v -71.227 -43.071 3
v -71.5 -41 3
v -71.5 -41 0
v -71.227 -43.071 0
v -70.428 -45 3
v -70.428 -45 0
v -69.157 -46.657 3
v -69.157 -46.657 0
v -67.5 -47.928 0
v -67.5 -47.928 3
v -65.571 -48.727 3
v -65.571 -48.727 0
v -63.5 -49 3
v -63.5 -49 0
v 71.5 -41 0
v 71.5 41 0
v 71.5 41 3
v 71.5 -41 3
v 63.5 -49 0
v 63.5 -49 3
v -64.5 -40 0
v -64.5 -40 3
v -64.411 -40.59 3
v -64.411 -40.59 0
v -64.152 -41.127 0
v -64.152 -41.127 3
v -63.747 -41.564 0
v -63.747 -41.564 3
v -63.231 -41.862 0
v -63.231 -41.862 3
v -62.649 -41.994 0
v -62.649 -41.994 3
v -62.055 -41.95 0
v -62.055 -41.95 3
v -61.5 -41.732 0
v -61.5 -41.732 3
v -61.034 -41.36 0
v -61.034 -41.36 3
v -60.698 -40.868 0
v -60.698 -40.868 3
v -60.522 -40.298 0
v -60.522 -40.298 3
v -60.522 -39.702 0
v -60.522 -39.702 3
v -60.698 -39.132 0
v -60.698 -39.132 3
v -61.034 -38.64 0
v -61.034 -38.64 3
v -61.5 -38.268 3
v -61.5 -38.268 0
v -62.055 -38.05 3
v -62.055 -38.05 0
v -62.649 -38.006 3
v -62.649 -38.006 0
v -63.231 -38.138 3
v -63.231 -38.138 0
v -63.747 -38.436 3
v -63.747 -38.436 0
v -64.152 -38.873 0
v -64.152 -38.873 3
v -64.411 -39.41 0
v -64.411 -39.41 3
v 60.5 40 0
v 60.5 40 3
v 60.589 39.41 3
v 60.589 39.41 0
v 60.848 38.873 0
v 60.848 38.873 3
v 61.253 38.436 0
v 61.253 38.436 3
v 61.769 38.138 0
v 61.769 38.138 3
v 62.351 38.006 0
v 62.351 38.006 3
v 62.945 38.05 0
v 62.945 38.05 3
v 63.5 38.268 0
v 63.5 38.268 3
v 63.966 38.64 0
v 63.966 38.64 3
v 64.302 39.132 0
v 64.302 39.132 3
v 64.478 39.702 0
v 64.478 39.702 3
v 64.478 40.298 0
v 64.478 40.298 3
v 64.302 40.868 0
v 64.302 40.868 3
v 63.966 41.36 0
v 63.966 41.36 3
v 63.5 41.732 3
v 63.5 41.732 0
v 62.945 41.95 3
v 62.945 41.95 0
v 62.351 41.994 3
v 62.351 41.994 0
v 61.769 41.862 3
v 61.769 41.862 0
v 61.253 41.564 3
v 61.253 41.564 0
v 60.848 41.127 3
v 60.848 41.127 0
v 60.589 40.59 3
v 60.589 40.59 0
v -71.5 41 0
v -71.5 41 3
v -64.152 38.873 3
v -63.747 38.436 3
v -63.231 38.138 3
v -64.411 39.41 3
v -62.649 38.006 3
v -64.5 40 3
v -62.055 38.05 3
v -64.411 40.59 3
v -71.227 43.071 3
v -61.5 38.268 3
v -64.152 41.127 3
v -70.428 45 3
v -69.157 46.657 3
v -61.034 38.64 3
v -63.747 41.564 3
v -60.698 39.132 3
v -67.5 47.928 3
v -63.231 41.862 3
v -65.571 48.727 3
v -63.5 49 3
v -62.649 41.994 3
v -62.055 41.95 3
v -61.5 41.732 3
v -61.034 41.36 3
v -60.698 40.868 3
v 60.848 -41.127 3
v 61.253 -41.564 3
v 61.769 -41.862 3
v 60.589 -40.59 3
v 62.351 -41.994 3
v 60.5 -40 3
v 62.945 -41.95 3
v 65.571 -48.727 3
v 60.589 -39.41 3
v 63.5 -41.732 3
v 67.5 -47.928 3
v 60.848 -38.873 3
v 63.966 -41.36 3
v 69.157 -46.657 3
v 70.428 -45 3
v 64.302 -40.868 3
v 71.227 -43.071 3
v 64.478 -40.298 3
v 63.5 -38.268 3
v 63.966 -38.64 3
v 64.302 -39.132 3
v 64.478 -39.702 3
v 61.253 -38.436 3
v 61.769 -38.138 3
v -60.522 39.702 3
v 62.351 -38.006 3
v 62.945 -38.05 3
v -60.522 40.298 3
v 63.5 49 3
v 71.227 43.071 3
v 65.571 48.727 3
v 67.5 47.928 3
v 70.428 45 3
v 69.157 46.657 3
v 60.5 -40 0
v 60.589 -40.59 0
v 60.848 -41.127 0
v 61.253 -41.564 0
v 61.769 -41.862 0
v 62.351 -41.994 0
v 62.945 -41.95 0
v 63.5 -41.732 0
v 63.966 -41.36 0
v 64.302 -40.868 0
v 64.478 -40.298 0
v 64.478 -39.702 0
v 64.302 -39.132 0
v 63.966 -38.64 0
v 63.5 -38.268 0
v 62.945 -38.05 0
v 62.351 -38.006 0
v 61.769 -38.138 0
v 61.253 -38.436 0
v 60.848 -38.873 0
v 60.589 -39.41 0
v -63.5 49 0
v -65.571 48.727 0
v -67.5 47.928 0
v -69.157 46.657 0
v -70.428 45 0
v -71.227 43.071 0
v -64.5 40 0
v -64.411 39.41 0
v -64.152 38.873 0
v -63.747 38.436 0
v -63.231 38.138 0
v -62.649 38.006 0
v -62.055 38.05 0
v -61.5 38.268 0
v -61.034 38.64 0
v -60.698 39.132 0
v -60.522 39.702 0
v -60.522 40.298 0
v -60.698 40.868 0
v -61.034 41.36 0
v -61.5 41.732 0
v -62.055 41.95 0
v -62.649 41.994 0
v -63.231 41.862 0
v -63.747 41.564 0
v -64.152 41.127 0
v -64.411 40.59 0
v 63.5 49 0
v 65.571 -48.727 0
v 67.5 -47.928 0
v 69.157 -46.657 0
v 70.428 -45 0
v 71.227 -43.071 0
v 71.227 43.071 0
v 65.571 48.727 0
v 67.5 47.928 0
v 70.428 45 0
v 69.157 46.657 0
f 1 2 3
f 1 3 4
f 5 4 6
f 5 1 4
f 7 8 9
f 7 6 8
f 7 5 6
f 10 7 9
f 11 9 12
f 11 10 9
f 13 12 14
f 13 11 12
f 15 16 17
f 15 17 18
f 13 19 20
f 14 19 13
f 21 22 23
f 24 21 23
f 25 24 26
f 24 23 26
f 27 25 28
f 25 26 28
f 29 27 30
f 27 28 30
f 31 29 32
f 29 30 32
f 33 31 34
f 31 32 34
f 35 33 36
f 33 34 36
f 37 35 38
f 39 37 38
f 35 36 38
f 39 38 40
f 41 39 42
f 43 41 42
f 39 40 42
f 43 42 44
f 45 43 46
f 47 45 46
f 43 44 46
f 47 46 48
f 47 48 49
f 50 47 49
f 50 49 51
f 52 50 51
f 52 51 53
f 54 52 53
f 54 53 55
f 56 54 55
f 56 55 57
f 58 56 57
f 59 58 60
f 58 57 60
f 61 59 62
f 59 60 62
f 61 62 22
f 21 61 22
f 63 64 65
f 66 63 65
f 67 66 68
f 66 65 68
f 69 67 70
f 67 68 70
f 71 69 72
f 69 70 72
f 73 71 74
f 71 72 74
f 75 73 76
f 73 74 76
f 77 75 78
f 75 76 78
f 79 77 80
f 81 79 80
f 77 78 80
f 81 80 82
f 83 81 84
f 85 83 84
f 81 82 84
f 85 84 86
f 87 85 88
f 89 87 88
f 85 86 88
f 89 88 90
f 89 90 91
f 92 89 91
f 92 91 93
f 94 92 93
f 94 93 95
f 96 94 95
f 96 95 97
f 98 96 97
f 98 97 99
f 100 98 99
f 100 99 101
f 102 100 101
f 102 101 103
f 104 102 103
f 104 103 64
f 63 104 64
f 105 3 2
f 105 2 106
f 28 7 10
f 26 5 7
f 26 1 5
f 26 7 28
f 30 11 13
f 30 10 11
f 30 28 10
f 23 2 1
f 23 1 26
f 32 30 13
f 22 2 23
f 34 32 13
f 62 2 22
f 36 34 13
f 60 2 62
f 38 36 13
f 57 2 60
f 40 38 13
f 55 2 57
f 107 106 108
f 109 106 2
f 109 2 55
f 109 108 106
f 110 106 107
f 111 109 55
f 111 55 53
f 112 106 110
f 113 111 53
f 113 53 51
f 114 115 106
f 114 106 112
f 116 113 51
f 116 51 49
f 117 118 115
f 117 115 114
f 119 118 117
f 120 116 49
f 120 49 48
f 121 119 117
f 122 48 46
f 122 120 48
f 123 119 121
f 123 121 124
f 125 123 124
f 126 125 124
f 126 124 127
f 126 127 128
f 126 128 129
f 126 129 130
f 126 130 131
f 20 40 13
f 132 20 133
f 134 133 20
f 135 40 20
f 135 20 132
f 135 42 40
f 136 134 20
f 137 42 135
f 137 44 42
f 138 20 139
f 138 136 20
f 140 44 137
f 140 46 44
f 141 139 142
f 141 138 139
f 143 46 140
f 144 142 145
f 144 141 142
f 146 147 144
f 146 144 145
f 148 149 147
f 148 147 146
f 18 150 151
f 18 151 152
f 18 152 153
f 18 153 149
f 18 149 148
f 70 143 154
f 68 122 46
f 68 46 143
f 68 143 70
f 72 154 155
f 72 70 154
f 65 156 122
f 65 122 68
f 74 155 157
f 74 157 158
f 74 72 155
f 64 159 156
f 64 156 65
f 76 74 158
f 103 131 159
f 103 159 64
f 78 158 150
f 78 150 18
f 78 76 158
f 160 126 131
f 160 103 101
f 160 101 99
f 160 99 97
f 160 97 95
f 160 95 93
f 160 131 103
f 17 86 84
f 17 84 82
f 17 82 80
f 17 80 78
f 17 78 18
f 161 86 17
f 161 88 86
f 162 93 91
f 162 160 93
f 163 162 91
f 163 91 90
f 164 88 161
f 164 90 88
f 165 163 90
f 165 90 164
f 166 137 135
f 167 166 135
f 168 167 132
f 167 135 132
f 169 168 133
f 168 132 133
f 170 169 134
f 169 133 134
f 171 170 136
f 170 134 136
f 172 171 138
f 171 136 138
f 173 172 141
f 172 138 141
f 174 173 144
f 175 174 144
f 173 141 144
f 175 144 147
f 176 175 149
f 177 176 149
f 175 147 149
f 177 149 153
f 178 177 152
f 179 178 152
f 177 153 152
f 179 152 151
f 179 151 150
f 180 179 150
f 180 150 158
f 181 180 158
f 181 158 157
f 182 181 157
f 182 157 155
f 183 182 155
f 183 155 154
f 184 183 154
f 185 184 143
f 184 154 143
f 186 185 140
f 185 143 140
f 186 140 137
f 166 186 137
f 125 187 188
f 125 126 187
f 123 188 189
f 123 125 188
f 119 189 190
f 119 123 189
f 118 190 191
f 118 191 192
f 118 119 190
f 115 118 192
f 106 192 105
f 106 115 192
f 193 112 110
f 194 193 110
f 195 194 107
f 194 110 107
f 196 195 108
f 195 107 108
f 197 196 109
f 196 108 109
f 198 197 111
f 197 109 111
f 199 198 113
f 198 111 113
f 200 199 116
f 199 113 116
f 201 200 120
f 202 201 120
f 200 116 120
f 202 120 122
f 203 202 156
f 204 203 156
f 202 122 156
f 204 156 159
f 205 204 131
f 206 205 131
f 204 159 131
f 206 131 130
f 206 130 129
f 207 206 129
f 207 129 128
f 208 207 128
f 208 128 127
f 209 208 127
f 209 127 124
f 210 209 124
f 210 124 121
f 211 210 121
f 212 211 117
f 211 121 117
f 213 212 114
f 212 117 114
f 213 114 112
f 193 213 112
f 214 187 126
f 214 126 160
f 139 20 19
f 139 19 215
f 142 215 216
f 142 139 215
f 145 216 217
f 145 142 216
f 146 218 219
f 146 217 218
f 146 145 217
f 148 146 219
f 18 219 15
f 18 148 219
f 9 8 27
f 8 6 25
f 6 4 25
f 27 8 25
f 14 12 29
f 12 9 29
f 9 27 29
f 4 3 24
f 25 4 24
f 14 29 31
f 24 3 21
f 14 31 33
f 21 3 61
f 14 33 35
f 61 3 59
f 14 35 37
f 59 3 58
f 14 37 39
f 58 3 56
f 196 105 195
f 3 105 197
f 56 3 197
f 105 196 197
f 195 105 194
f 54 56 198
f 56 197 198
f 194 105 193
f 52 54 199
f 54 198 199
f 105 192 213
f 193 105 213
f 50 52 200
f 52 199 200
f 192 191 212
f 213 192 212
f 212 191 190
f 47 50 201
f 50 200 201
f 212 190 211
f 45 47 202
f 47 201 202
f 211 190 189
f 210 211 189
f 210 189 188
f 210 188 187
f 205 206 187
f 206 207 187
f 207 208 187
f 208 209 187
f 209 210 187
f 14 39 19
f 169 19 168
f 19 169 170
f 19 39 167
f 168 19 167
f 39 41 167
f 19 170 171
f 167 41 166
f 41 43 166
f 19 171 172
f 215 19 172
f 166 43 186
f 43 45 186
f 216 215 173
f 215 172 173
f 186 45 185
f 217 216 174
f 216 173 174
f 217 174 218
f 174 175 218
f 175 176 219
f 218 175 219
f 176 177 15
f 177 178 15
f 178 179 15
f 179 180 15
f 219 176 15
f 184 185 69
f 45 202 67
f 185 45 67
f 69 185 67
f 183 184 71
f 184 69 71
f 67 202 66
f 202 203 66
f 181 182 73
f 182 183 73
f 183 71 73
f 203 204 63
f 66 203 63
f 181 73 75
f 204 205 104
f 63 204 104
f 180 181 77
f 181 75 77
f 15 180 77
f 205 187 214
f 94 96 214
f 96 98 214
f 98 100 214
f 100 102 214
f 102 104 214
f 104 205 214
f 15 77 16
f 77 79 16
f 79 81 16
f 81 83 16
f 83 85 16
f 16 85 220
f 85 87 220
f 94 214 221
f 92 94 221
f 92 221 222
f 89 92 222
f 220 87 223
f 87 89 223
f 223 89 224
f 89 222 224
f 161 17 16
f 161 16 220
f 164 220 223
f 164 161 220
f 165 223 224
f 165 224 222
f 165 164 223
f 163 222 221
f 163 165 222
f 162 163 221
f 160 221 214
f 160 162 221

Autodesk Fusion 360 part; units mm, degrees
sketch "Boceto1" plane through (0, 0, 0) normal (0, 0, 1) x (1, 0, 0)
  line L0 (71.5, 0) -> (-71.5, 0)
  line L1 (0, -49) -> (0, 49)
  line L2 (-71.5, 49) -> (71.5, 49)
  line L3 (71.5, 49) -> (71.5, -49)
  line L4 (71.5, -49) -> (-71.5, -49)
  line L5 (-71.5, -49) -> (-71.5, 49)
  line L6 (-71.5, 49) -> (71.5, -49) construction
  line L7 (71.5, 49) -> (-71.5, -49) construction
  dimension "d1" = 143
  dimension "d2" = 98
extrude "Extruir1" add sketch "Boceto1" along normal blind 3
sketch "Boceto2" plane through (0, 0, 3) normal (0, 0, 1) x (-1, 0, 0)
  line L0 (71.5, 49) -> (-71.5, 49)
  line L1 (-71.5, 49) -> (-71.5, -49)
  line L2 (-71.5, -49) -> (71.5, -49)
  line L3 (71.5, -49) -> (71.5, 49)
  line L4 (71.5, -49) -> (62.5, -49)
  line L5 (62.5, -49) -> (62.5, -40)
  line L6 (71.5, 49) -> (62.5, 49)
  line L7 (62.5, 49) -> (62.5, 40)
  line L8 (-71.5, 49) -> (-71.5, 40)
  line L9 (-71.5, 40) -> (-62.5, 40)
  line L10 (-71.5, -49) -> (-62.5, -49)
  line L11 (-62.5, -49) -> (-62.5, -40)
  circle A0 centre (62.5, -40) radius 2
  circle A1 centre (62.5, 40) radius 2
  circle A2 centre (-62.5, -40) radius 2
  circle A3 centre (-62.5, 40) radius 2
  dimension "d7" = 9
  dimension "d8" = 9
  dimension "d9" = 9
  dimension "d10" = 9
  dimension "d11" = 9
  dimension "d12" = 9
  dimension "d13" = 9
  dimension "d14" = 9
  dimension "d15" = 4
  dimension "d16" = 4
  dimension "d17" = 4
  dimension "d18" = 4
extrude "Extruir2" cut sketch "Boceto2" against normal blind 3 contours A1 | A3 | A2 | A0
fillet "Empalme2" radius 8 4 edges at (-71.5, -49, 1.5) (-71.5, 49, 1.5) (71.5, -49, 1.5) (71.5, 49, 1.5)
